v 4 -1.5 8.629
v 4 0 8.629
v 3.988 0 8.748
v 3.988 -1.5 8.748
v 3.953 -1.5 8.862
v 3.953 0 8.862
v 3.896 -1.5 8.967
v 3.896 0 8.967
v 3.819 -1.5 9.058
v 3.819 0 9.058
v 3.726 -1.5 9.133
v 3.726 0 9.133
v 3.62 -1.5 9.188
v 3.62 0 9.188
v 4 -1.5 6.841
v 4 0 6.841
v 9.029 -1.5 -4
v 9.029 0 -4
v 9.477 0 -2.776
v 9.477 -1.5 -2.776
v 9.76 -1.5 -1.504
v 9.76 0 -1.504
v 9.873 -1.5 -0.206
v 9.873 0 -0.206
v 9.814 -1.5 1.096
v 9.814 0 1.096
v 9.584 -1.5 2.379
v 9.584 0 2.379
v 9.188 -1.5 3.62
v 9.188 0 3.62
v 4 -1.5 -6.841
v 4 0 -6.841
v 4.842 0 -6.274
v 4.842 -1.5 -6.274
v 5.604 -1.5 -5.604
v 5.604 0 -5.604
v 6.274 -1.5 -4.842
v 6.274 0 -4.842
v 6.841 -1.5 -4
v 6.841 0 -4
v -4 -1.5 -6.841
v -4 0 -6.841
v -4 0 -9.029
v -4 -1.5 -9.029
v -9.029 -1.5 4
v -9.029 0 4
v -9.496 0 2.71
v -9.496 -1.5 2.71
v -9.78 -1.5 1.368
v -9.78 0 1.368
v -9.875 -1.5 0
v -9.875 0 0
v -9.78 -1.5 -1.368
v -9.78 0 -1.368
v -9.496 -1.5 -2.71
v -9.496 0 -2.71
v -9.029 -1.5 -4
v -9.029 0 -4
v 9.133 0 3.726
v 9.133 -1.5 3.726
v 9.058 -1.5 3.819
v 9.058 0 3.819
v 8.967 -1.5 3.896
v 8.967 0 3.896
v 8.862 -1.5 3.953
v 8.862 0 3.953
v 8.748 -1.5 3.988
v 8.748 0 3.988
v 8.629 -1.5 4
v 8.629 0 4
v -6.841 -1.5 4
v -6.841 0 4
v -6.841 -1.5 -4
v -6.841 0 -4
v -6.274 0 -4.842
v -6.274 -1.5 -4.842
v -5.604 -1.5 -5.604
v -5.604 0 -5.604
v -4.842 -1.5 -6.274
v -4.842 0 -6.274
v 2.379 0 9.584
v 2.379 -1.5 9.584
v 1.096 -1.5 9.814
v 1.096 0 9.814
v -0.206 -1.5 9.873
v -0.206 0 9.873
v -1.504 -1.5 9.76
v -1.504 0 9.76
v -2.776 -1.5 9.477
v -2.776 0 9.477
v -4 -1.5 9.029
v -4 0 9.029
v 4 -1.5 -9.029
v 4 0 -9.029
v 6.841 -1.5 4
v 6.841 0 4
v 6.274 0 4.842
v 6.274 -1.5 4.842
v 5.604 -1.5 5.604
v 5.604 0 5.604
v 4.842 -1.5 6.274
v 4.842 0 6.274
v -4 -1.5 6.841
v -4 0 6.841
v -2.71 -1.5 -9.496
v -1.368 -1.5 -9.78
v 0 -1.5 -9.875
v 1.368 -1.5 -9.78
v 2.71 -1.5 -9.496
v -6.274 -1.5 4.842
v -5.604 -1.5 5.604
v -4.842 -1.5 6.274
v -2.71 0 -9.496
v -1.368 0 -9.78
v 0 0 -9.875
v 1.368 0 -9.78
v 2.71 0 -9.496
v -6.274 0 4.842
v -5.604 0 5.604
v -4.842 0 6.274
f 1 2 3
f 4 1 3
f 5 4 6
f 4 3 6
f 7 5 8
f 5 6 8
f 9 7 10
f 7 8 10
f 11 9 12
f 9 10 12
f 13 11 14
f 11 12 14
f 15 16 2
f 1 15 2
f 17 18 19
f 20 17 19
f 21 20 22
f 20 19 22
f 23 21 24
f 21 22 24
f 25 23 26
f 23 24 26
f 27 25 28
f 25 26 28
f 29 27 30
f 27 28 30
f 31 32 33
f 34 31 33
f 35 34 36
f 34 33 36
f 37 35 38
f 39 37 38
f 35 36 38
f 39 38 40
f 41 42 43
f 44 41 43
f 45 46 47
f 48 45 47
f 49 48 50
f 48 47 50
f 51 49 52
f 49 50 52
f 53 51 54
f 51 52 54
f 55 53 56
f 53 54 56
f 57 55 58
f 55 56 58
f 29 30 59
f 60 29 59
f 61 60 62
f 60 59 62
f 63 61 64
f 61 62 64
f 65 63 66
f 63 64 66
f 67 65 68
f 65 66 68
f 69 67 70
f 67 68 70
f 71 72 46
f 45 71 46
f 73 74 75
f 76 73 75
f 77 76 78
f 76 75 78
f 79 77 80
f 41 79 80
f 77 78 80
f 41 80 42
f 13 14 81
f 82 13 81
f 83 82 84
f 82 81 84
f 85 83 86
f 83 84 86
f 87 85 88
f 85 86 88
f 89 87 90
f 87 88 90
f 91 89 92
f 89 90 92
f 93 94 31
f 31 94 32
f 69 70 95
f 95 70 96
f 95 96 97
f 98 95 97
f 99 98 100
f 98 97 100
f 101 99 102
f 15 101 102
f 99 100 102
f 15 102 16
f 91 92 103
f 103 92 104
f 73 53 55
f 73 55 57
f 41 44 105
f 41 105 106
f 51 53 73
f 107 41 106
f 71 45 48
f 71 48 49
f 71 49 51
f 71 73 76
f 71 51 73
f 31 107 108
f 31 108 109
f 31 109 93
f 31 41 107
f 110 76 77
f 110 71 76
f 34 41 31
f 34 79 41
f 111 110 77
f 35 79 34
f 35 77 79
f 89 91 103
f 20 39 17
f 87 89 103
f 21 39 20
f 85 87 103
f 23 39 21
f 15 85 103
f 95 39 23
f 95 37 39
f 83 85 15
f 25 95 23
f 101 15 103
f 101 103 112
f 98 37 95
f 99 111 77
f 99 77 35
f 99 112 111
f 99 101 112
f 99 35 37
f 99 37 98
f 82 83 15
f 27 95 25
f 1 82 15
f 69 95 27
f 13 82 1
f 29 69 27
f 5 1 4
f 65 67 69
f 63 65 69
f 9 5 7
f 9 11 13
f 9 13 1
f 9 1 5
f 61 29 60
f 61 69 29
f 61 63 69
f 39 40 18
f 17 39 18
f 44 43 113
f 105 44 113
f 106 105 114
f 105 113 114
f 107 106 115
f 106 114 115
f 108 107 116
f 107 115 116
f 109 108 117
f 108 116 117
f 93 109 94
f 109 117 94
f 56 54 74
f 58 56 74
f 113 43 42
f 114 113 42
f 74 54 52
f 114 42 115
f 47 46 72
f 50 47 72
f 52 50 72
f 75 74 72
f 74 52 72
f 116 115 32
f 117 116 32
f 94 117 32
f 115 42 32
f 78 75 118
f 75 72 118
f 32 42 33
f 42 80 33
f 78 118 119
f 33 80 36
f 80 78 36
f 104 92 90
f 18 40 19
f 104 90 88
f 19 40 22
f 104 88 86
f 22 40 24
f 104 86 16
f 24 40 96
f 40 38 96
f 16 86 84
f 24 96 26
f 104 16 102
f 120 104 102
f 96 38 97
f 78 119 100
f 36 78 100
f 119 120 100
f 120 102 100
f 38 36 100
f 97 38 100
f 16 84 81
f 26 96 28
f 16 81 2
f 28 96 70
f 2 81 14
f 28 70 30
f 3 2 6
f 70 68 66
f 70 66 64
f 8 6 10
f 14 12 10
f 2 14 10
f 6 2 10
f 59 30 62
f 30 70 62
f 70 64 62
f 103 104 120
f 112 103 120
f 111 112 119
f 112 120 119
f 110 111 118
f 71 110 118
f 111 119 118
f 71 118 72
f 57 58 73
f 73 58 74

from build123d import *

# Parameters (mm, degrees)
F1_DEPTH = 1.5


with BuildPart() as f1:
    # F0 (on Front) → F1 (new body)
    with BuildSketch(Plane.XZ):
        with BuildLine():
            ThreePointArc((6.841464, -4), (7.649321, -2.072079), (7.925, 0))
            ThreePointArc((7.925, 0), (7.649321, 2.072079), (6.841464, 4))
            ThreePointArc((6.841464, 4), (5.603821, 5.603821), (4, 6.841464))
            ThreePointArc((4, 6.841464), (0, 7.925), (-4, 6.841464))
            ThreePointArc((-4, 6.841464), (-5.603821, 5.603821), (-6.841464, 4))
            ThreePointArc((-6.841464, 4), (-7.925, 0), (-6.841464, -4))
            ThreePointArc((-6.841464, -4), (-5.603821, -5.603821), (-4, -6.841464))
            ThreePointArc((-4, -6.841464), (0, -7.925), (4, -6.841464))
            ThreePointArc((4, -6.841464), (5.603821, -5.603821), (6.841464, -4))
        make_face()
        with BuildLine():
            ThreePointArc((-6.841464, -4), (-7.925, 0), (-6.841464, 4))
            Line((-6.841464, 4), (-9.0286, 4))
            ThreePointArc((-9.0286, 4), (-9.875, 0), (-9.0286, -4))
            Line((-9.0286, -4), (-6.841464, -4))
        make_face()
        with BuildLine():
            ThreePointArc((-4, 6.841464), (0, 7.925), (4, 6.841464))
            Line((4, 6.841464), (4, 8.629347))
            ThreePointArc((4, 8.629347), (3.895968, 8.96701), (3.619946, 9.187579))
            ThreePointArc((3.619946, 9.187579), (-0.205983, 9.872851), (-4, 9.0286))
            Line((-4, 9.0286), (-4, 6.841464))
        make_face()
        with BuildLine():
            Line((4, -9.0286), (4, -6.841464))
            ThreePointArc((4, -6.841464), (0, -7.925), (-4, -6.841464))
            Line((-4, -6.841464), (-4, -9.0286))
            ThreePointArc((-4, -9.0286), (0, -9.875), (4, -9.0286))
        make_face()
        with BuildLine():
            ThreePointArc((6.841464, 4), (7.649321, 2.072079), (7.925, 0))
            ThreePointArc((7.925, 0), (7.649321, -2.072079), (6.841464, -4))
            Line((6.841464, -4), (9.0286, -4))
            ThreePointArc((9.0286, -4), (9.872851, -0.205983), (9.187579, 3.619946))
            ThreePointArc((9.187579, 3.619946), (8.96701, 3.895968), (8.629347, 4))
            Line((8.629347, 4), (6.841464, 4))
        make_face()
    extrude(amount=F1_DEPTH)


solid = f1.part
